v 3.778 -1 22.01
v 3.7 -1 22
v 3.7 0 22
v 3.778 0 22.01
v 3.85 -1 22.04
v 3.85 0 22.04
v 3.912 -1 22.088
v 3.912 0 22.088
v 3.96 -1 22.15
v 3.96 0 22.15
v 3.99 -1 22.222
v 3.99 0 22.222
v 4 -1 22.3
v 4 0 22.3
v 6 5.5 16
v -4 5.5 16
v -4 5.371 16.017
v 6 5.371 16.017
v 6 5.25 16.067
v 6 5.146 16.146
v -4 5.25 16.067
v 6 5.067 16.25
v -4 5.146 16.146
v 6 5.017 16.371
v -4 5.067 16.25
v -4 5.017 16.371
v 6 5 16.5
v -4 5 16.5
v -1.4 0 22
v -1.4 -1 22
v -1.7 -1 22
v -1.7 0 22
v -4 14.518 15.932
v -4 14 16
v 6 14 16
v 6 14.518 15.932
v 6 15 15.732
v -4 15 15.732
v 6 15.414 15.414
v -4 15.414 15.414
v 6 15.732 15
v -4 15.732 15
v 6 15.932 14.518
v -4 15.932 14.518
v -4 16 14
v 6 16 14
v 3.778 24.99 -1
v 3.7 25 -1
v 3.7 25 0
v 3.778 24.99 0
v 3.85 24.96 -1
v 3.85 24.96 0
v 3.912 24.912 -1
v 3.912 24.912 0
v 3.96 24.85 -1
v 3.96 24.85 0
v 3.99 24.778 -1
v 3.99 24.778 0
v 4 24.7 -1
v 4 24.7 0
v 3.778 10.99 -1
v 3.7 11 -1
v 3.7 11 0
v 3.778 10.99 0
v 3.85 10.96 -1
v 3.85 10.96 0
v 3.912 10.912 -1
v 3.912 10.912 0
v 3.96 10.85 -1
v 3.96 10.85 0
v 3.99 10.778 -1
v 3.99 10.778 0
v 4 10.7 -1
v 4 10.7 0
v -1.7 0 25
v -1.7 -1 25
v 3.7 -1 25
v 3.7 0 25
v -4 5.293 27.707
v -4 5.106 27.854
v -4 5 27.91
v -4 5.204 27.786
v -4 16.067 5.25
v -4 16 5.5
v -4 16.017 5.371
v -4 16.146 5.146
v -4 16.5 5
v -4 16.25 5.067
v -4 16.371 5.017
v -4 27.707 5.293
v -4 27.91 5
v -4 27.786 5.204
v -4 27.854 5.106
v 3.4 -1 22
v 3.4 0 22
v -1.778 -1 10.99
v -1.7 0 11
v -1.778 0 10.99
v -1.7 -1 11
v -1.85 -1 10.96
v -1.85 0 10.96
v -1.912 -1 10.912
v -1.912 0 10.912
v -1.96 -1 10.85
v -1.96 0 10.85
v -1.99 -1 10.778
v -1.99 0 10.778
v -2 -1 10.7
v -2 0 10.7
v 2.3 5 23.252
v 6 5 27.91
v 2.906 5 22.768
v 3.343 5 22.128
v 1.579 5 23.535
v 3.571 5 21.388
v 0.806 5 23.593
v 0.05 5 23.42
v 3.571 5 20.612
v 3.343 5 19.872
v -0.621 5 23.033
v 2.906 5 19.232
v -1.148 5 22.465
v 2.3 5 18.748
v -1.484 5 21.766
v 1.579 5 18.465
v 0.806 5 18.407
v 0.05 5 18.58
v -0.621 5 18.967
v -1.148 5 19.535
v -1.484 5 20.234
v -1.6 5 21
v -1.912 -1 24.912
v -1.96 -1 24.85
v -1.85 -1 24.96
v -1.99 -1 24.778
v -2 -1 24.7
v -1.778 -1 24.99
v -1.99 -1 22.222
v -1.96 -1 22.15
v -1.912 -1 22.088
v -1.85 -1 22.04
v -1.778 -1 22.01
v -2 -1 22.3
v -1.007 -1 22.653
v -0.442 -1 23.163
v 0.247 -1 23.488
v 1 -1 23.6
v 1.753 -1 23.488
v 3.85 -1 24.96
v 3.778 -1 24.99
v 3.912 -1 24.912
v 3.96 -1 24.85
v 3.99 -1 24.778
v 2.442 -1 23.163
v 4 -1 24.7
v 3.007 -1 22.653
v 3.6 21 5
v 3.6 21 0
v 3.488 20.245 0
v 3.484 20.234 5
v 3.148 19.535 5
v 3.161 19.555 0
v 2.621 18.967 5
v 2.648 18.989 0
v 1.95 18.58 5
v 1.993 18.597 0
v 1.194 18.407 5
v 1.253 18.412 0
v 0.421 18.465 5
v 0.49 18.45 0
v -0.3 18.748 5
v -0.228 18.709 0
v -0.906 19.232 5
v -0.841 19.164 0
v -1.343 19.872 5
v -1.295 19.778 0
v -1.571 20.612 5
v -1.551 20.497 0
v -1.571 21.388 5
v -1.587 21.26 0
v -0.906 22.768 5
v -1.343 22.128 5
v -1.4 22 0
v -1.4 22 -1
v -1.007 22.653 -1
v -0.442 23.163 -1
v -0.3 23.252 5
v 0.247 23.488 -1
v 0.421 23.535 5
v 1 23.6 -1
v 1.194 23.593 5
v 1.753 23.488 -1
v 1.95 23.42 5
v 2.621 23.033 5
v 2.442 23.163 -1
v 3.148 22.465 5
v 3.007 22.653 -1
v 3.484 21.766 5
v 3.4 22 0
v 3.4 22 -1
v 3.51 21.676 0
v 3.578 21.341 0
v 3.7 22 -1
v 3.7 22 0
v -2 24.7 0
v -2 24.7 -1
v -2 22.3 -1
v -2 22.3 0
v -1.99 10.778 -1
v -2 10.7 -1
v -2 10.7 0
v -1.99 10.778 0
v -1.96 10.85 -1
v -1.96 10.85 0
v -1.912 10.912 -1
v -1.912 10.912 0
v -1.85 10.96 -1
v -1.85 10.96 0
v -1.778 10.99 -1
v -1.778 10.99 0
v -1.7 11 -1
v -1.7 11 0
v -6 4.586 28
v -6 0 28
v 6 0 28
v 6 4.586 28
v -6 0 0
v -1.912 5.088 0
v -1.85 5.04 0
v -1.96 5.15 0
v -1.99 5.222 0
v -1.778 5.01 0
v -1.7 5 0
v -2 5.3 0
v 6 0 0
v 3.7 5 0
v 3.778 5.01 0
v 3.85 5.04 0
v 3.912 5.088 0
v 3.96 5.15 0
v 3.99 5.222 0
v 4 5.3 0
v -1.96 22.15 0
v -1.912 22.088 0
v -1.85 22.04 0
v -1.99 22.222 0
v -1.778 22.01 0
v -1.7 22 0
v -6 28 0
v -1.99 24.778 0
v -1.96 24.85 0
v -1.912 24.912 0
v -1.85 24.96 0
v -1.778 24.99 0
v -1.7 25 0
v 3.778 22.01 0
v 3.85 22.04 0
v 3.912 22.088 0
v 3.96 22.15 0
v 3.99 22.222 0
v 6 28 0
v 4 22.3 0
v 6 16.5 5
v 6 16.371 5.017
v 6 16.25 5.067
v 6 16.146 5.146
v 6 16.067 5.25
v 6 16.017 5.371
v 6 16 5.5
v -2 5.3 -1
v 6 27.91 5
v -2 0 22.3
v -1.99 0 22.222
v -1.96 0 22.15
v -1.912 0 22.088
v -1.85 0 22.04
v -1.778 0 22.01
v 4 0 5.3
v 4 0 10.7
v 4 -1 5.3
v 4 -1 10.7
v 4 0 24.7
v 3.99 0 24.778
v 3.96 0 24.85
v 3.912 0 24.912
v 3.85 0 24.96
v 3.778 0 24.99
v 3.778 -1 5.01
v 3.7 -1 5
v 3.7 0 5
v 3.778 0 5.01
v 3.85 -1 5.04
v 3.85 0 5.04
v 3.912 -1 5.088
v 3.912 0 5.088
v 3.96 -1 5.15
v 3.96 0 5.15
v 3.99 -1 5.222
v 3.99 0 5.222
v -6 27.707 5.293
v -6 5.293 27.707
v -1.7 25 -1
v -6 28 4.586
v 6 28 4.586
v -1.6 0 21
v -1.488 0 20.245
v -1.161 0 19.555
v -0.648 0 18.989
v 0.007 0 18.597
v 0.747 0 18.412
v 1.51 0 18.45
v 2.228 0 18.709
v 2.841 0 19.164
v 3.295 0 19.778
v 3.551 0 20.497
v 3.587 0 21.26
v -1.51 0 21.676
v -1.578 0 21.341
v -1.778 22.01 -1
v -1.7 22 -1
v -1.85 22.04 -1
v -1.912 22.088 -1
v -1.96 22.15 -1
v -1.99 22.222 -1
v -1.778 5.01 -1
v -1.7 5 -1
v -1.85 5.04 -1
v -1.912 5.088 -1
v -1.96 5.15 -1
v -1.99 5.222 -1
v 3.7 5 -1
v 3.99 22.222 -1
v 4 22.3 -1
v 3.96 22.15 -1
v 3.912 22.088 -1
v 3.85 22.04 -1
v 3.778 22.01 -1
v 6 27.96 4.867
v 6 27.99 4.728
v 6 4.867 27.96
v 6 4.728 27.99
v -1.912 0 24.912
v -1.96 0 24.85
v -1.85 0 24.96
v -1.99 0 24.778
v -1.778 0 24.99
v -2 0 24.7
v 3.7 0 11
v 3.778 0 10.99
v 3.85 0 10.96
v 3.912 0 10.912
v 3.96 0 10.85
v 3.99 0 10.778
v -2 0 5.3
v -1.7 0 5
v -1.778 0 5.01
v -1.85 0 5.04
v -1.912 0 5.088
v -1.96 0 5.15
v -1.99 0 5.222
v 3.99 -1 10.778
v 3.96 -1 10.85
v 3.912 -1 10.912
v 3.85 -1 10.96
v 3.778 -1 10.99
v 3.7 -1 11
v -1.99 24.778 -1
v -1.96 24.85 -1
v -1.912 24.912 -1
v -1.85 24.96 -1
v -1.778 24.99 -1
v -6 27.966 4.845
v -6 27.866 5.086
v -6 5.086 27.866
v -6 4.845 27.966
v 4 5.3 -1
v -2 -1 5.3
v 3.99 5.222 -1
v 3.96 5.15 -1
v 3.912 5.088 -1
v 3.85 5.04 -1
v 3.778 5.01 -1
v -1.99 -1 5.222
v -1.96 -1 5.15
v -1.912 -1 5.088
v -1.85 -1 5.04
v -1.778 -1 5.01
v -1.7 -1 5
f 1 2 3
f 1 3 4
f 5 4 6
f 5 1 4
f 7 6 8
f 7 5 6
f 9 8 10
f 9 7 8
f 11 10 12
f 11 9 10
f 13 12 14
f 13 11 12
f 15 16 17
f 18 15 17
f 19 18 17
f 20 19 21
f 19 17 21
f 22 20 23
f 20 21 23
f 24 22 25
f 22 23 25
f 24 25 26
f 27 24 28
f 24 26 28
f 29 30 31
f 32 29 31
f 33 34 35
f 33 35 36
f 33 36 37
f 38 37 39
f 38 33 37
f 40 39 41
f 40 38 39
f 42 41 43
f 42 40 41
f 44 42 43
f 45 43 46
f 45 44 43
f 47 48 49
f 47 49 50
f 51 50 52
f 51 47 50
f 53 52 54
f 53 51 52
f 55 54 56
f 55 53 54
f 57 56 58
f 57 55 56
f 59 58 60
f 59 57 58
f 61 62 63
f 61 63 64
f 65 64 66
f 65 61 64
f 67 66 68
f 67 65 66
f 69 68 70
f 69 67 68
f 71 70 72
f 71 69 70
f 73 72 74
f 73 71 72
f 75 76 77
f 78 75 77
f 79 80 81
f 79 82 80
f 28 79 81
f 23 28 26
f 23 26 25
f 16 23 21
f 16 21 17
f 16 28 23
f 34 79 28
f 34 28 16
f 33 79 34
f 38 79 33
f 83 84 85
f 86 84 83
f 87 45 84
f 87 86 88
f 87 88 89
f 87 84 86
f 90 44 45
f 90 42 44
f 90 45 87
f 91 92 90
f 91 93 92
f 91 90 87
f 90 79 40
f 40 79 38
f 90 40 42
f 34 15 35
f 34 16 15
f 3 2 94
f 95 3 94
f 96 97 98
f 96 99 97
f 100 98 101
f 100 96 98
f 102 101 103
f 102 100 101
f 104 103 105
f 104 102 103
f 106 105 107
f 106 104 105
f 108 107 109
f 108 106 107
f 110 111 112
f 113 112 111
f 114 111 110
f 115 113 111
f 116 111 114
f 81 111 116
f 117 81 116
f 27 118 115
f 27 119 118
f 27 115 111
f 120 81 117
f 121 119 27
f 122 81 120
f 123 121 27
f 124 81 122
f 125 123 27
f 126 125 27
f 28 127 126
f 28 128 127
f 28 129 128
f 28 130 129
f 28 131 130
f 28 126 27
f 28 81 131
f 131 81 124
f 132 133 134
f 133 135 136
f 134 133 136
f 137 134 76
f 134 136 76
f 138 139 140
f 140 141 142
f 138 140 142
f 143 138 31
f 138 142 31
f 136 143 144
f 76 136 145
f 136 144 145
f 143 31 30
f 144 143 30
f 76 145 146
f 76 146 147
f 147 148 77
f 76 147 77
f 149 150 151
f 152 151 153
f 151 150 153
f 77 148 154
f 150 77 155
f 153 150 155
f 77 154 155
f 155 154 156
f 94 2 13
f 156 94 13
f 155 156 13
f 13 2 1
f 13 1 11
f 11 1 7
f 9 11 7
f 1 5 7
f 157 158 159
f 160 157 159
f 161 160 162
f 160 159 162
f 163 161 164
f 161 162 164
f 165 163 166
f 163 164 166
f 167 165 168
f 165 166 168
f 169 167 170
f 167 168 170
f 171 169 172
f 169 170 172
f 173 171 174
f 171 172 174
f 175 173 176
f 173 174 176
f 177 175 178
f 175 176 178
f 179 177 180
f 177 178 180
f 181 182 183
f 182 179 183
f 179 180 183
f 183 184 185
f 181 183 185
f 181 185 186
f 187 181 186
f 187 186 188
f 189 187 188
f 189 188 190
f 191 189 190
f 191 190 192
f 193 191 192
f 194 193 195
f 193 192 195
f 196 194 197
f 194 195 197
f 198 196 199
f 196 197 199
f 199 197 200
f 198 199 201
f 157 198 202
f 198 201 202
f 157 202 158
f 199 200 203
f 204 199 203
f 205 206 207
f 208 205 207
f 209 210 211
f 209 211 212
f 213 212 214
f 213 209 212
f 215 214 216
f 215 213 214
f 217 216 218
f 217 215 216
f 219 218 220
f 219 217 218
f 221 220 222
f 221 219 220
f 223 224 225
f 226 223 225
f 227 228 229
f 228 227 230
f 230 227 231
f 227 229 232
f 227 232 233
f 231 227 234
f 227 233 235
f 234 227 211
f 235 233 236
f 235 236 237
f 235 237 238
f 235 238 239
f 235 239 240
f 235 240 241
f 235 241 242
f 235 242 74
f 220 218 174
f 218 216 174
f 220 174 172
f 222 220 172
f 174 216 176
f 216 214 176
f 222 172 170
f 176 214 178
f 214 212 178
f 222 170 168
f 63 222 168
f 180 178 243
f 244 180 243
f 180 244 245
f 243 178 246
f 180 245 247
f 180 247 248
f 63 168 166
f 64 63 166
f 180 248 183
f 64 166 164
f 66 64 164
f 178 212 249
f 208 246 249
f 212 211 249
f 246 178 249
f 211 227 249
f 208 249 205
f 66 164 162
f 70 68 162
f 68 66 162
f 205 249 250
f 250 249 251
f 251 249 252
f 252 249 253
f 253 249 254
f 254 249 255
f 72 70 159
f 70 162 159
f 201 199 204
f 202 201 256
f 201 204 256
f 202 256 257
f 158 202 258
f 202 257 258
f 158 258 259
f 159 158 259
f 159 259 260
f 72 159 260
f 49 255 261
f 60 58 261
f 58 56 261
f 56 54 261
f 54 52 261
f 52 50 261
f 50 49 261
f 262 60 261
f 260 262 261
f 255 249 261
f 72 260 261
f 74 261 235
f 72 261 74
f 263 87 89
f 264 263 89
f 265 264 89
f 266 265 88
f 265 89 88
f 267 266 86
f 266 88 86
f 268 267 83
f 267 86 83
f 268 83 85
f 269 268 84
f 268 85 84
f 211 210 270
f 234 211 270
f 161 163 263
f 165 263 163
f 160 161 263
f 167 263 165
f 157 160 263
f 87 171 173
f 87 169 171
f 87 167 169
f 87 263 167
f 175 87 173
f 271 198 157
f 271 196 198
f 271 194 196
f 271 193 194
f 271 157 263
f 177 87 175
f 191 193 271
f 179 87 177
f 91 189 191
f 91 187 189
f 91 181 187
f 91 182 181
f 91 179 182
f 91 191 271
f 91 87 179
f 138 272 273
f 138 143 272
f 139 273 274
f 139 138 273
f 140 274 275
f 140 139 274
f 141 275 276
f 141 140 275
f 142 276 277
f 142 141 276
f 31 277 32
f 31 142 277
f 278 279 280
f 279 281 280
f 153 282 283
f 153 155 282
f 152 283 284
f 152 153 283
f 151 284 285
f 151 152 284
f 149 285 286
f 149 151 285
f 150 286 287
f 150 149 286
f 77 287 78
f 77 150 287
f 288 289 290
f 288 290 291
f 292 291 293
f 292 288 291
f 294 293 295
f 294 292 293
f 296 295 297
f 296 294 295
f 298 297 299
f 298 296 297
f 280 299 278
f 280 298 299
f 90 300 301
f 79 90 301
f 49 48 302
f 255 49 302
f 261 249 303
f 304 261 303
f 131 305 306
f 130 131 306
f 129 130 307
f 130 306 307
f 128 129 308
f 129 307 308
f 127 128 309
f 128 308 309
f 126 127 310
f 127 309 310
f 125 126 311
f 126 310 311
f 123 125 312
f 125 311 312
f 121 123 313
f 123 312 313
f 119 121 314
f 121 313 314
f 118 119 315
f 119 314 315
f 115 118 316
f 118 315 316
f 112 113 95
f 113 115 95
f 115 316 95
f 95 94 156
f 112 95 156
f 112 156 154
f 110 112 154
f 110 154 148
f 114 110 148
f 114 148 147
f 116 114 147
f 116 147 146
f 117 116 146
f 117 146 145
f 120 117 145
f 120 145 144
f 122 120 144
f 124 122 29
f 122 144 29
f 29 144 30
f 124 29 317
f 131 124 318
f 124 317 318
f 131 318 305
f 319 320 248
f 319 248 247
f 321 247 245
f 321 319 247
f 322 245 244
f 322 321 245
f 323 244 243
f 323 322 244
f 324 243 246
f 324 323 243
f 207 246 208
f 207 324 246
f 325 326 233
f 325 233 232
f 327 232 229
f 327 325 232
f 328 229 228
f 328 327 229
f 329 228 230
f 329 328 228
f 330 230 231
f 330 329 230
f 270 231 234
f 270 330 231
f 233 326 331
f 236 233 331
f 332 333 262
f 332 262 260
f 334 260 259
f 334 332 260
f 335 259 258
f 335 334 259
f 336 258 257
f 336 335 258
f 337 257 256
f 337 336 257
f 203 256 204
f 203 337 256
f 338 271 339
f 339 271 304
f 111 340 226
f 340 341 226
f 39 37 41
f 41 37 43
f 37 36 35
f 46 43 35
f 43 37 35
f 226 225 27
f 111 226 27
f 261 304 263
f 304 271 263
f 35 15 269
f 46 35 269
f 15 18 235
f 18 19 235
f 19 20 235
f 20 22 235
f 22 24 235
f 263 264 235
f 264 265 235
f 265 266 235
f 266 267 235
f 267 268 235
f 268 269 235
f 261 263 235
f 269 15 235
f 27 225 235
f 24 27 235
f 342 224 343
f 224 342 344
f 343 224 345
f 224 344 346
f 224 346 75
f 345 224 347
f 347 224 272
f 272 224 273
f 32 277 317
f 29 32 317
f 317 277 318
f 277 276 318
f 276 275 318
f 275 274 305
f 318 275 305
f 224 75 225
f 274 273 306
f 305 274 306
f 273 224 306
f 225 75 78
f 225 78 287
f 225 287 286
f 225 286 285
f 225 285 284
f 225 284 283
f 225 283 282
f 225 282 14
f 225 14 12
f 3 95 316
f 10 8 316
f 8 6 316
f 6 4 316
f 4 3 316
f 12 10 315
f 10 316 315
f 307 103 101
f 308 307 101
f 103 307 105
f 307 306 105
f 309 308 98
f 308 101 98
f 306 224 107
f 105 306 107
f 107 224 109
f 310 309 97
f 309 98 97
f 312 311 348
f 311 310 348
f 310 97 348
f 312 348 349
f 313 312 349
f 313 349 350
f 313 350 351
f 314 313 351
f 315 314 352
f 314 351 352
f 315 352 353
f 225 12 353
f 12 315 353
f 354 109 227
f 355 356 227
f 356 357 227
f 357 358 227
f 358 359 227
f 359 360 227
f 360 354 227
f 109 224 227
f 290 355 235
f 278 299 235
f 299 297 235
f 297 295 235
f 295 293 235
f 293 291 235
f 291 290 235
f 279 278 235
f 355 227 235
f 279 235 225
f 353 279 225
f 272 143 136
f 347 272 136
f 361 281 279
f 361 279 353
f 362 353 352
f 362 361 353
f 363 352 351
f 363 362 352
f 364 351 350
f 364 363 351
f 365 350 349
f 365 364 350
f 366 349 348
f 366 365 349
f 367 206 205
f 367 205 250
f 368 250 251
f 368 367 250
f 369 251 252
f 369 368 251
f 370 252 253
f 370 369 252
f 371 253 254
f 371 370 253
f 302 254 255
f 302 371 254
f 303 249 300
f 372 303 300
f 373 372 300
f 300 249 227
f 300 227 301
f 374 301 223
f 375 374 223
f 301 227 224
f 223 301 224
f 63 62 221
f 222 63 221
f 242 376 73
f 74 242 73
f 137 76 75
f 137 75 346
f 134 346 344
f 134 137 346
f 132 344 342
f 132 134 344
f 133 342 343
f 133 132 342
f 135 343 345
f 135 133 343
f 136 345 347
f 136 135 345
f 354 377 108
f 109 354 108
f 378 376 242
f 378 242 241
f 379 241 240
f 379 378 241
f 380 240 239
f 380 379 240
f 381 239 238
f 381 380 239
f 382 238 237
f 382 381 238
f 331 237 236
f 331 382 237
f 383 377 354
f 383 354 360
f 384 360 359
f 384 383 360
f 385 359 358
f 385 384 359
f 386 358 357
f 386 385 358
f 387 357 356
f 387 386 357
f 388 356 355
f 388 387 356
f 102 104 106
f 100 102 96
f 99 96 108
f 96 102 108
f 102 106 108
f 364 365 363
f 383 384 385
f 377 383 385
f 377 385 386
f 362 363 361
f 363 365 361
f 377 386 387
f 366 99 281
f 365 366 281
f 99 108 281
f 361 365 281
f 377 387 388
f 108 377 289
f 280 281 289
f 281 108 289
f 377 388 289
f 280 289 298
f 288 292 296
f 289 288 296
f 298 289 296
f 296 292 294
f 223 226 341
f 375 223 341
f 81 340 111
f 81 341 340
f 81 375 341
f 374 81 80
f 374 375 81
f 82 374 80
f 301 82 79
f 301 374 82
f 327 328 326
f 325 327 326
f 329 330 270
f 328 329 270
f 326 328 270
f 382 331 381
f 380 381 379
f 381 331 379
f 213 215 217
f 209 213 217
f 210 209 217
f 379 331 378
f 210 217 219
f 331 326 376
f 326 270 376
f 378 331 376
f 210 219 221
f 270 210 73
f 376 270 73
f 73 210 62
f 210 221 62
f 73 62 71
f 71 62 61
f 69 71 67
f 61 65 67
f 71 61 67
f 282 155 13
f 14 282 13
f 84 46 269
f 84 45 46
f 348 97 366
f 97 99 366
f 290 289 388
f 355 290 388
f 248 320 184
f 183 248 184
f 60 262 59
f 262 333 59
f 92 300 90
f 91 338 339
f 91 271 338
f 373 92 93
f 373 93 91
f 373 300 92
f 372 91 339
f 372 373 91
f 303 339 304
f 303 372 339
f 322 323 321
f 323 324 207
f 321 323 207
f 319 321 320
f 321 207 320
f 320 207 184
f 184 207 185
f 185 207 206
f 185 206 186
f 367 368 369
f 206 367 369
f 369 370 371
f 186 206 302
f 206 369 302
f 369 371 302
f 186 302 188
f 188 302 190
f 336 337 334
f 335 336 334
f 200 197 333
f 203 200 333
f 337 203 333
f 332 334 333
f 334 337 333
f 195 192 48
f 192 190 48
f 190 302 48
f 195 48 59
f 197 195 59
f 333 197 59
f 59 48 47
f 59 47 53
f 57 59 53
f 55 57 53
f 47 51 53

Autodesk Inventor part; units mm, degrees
sketch "Sketch_15" plane through (0, 0, 0) normal (1, 0, 0) x (0, 1, 0)
  line L0 (0, 28) -> (0, 0)
  line L1 (0, 0) -> (28, 0)
  line L2 (28, 0) -> (28, 4.5858)
  arc A0 (28, 4.5858) -> (27.7071, 5.2929) centre (27, 4.5858) ccw
  line L3 (27.7071, 5.2929) -> (5.2929, 27.7071)
  arc A1 (5.2929, 27.7071) -> (4.5858, 28) centre (4.5858, 27) ccw
  line L4 (4.5858, 28) -> (0, 28)
extrude "Extrusion1" add sketch "Sketch_15" along normal mid plane 12
sketch "Sketch_60" plane through (0, -1, 0) normal (0, 1, 0) x (1, 0, 0)
  line L0 (-6, 0) -> (-6, -28)
  line L1 (-6, -28) -> (6, -28)
  line L2 (6, -28) -> (6, 0)
  line L3 (6, 0) -> (-6, 0)
extrude "Extrusion2" add sketch "Sketch_60" along normal blind 1
sketch "Sketch_61" plane through (0, -1, 0) normal (0, 1, 0) x (1, 0, 0)
  line L0 (-6, 0) -> (-6, -28)
  line L1 (-6, -28) -> (6, -28)
  line L2 (6, -28) -> (6, 0)
  line L3 (6, 0) -> (-6, 0)
  arc A0 (-2, -10.7) -> (-1.7, -11) centre (-1.7, -10.7) ccw
  line L4 (-1.7, -11) -> (3.7, -11)
  arc A1 (3.7, -11) -> (4, -10.7) centre (3.7, -10.7) ccw
  line L5 (4, -10.7) -> (4, -5.3)
  arc A2 (4, -5.3) -> (3.7, -5) centre (3.7, -5.3) ccw
  line L6 (3.7, -5) -> (-1.7, -5)
  arc A3 (-1.7, -5) -> (-2, -5.3) centre (-1.7, -5.3) ccw
  line L7 (-2, -5.3) -> (-2, -10.7)
  arc A4 (-2, -24.7) -> (-1.7, -25) centre (-1.7, -24.7) ccw
  line L8 (-1.7, -25) -> (3.7, -25)
  arc A5 (3.7, -25) -> (4, -24.7) centre (3.7, -24.7) ccw
  line L9 (4, -24.7) -> (4, -22.3)
  arc A6 (4, -22.3) -> (3.7, -22) centre (3.7, -22.3) ccw
  line L10 (3.7, -22) -> (-1.7, -22)
  arc A7 (-1.7, -22) -> (-2, -22.3) centre (-1.7, -22.3) ccw
  line L11 (-2, -22.3) -> (-2, -24.7)
extrude "Extrusion3" cut sketch "Sketch_61" along normal blind 1
sketch "Sketch_62" plane through (0, 0, 0) normal (0, 0, 1) x (1, 0, 0)
  line L0 (-6, 0) -> (6, 0)
  line L1 (6, 0) -> (6, 28)
  line L2 (6, 28) -> (-6, 28)
  line L3 (-6, 28) -> (-6, 0)
extrude "Extrusion4" add sketch "Sketch_62" along normal mid plane 2
sketch "Sketch_63" plane through (0, 0, -1) normal (0, 0, 1) x (1, 0, 0)
  line L0 (-6, 0) -> (6, 0)
  line L1 (6, 0) -> (6, 28)
  line L2 (6, 28) -> (-6, 28)
  line L3 (-6, 28) -> (-6, 0)
  line L4 (-2, 10.7) -> (-2, 5.3)
  arc A0 (-2, 5.3) -> (-1.7, 5) centre (-1.7, 5.3) ccw
  line L5 (-1.7, 5) -> (3.7, 5)
  arc A1 (3.7, 5) -> (4, 5.3) centre (3.7, 5.3) ccw
  line L6 (4, 5.3) -> (4, 10.7)
  arc A2 (4, 10.7) -> (3.7, 11) centre (3.7, 10.7) ccw
  line L7 (3.7, 11) -> (-1.7, 11)
  arc A3 (-1.7, 11) -> (-2, 10.7) centre (-1.7, 10.7) ccw
  line L8 (-2, 24.7) -> (-2, 22.3)
  arc A4 (-2, 22.3) -> (-1.7, 22) centre (-1.7, 22.3) ccw
  line L9 (-1.7, 22) -> (3.7, 22)
  arc A5 (3.7, 22) -> (4, 22.3) centre (3.7, 22.3) ccw
  line L10 (4, 22.3) -> (4, 24.7)
  arc A6 (4, 24.7) -> (3.7, 25) centre (3.7, 24.7) ccw
  line L11 (3.7, 25) -> (-1.7, 25)
  arc A7 (-1.7, 25) -> (-2, 24.7) centre (-1.7, 24.7) ccw
extrude "Extrusion5" cut sketch "Sketch_63" along normal blind 1
sketch "Sketch_12" plane through (-4, 0, 0) normal (1, 0, 0) x (0, 0, -1)
  line L0 (-28, 5) -> (-16.5, 5)
  arc A0 (-16.5, 5) -> (-16, 5.5) centre (-16.5, 5.5) ccw
  line L1 (-16, 5.5) -> (-16, 14)
  arc A1 (-14, 16) -> (-16, 14) centre (-14, 14) ccw
  line L2 (-14, 16) -> (-5.5, 16)
  arc A2 (-5.5, 16) -> (-5, 16.5) centre (-5.5, 16.5) ccw
  line L3 (-5, 16.5) -> (-5, 28)
  line L4 (-5, 28) -> (-28, 28)
  line L5 (-28, 28) -> (-28, 5)
extrude "Extrusion6" cut sketch "Sketch_12" along normal blind 16
sketch "Sketch_20" plane through (0, 0, 0) normal (0, 0, 1) x (1, 0, 0)
  circle A0 centre (1, 21) radius 2.6
extrude "Extrusion7" cut sketch "Sketch_20" along normal mid plane 10
sketch "Sketch_29" plane through (0, 0, 0) normal (0, 1, 0) x (-1, 0, 0)
  circle A0 centre (-1, 21) radius 2.6
extrude "Extrusion8" cut sketch "Sketch_29" along normal mid plane 10
ref_plane "to_bolt_row_1_to_3_XY" through (1, 21, 5) normal (0, 0, 1) x (1, 0, 0)
ref_plane "to_bolt_row_1_to_3_YZ" through (1, 21, 5) normal (1, 0, 0) x (0, 1, 0)
ref_plane "to_bolt_row_1_to_3_ZX" through (1, 21, 5) normal (0, 1, 0) x (0, 0, 1)
ref_plane "to_bolt_row_1_to_3_base_XY" through (1, 5, 21) normal (0, 1, 0) x (1, 0, 0)
ref_plane "to_bolt_row_1_to_3_base_YZ" through (1, 5, 21) normal (1, 0, 0) x (0, 0, -1)
ref_plane "to_bolt_row_1_to_3_base_ZX" through (1, 5, 21) normal (0, 0, -1) x (0, 1, 0)
ref_plane "to_nut_row_1_to_3_XY" through (1, 21, -2) normal (0, 0, 1) x (1, 0, 0)
ref_plane "to_nut_row_1_to_3_YZ" through (1, 21, -2) normal (1, 0, 0) x (0, 1, 0)
ref_plane "to_nut_row_1_to_3_ZX" through (1, 21, -2) normal (0, 1, 0) x (0, 0, 1)
ref_plane "to_nut_row_1_to_3_base_XY" through (1, -2, 21) normal (0, 1, 0) x (1, 0, 0)
ref_plane "to_nut_row_1_to_3_base_YZ" through (1, -2, 21) normal (1, 0, 0) x (0, 0, -1)
ref_plane "to_nut_row_1_to_3_base_ZX" through (1, -2, 21) normal (0, 0, -1) x (0, 1, 0)
ref_plane "bracket_to_dummy_XY" through (0, 0, 0) normal (0, 1, 0) x (1, 0, 0)
ref_plane "bracket_to_dummy_YZ" through (0, 0, 0) normal (1, 0, 0) x (0, 0, -1)
ref_plane "bracket_to_dummy_ZX" through (0, 0, 0) normal (0, 0, -1) x (0, 1, 0)
ref_plane "bracket_to_bolt_XY" through (1, 21, 0) normal (0, 0, 1) x (1, 0, 0)
ref_plane "bracket_to_bolt_YZ" through (1, 21, 0) normal (1, 0, 0) x (0, 1, 0)
ref_plane "bracket_to_bolt_ZX" through (1, 21, 0) normal (0, 1, 0) x (0, 0, 1)
properties part number "HBLFSL5hblfsn5"
